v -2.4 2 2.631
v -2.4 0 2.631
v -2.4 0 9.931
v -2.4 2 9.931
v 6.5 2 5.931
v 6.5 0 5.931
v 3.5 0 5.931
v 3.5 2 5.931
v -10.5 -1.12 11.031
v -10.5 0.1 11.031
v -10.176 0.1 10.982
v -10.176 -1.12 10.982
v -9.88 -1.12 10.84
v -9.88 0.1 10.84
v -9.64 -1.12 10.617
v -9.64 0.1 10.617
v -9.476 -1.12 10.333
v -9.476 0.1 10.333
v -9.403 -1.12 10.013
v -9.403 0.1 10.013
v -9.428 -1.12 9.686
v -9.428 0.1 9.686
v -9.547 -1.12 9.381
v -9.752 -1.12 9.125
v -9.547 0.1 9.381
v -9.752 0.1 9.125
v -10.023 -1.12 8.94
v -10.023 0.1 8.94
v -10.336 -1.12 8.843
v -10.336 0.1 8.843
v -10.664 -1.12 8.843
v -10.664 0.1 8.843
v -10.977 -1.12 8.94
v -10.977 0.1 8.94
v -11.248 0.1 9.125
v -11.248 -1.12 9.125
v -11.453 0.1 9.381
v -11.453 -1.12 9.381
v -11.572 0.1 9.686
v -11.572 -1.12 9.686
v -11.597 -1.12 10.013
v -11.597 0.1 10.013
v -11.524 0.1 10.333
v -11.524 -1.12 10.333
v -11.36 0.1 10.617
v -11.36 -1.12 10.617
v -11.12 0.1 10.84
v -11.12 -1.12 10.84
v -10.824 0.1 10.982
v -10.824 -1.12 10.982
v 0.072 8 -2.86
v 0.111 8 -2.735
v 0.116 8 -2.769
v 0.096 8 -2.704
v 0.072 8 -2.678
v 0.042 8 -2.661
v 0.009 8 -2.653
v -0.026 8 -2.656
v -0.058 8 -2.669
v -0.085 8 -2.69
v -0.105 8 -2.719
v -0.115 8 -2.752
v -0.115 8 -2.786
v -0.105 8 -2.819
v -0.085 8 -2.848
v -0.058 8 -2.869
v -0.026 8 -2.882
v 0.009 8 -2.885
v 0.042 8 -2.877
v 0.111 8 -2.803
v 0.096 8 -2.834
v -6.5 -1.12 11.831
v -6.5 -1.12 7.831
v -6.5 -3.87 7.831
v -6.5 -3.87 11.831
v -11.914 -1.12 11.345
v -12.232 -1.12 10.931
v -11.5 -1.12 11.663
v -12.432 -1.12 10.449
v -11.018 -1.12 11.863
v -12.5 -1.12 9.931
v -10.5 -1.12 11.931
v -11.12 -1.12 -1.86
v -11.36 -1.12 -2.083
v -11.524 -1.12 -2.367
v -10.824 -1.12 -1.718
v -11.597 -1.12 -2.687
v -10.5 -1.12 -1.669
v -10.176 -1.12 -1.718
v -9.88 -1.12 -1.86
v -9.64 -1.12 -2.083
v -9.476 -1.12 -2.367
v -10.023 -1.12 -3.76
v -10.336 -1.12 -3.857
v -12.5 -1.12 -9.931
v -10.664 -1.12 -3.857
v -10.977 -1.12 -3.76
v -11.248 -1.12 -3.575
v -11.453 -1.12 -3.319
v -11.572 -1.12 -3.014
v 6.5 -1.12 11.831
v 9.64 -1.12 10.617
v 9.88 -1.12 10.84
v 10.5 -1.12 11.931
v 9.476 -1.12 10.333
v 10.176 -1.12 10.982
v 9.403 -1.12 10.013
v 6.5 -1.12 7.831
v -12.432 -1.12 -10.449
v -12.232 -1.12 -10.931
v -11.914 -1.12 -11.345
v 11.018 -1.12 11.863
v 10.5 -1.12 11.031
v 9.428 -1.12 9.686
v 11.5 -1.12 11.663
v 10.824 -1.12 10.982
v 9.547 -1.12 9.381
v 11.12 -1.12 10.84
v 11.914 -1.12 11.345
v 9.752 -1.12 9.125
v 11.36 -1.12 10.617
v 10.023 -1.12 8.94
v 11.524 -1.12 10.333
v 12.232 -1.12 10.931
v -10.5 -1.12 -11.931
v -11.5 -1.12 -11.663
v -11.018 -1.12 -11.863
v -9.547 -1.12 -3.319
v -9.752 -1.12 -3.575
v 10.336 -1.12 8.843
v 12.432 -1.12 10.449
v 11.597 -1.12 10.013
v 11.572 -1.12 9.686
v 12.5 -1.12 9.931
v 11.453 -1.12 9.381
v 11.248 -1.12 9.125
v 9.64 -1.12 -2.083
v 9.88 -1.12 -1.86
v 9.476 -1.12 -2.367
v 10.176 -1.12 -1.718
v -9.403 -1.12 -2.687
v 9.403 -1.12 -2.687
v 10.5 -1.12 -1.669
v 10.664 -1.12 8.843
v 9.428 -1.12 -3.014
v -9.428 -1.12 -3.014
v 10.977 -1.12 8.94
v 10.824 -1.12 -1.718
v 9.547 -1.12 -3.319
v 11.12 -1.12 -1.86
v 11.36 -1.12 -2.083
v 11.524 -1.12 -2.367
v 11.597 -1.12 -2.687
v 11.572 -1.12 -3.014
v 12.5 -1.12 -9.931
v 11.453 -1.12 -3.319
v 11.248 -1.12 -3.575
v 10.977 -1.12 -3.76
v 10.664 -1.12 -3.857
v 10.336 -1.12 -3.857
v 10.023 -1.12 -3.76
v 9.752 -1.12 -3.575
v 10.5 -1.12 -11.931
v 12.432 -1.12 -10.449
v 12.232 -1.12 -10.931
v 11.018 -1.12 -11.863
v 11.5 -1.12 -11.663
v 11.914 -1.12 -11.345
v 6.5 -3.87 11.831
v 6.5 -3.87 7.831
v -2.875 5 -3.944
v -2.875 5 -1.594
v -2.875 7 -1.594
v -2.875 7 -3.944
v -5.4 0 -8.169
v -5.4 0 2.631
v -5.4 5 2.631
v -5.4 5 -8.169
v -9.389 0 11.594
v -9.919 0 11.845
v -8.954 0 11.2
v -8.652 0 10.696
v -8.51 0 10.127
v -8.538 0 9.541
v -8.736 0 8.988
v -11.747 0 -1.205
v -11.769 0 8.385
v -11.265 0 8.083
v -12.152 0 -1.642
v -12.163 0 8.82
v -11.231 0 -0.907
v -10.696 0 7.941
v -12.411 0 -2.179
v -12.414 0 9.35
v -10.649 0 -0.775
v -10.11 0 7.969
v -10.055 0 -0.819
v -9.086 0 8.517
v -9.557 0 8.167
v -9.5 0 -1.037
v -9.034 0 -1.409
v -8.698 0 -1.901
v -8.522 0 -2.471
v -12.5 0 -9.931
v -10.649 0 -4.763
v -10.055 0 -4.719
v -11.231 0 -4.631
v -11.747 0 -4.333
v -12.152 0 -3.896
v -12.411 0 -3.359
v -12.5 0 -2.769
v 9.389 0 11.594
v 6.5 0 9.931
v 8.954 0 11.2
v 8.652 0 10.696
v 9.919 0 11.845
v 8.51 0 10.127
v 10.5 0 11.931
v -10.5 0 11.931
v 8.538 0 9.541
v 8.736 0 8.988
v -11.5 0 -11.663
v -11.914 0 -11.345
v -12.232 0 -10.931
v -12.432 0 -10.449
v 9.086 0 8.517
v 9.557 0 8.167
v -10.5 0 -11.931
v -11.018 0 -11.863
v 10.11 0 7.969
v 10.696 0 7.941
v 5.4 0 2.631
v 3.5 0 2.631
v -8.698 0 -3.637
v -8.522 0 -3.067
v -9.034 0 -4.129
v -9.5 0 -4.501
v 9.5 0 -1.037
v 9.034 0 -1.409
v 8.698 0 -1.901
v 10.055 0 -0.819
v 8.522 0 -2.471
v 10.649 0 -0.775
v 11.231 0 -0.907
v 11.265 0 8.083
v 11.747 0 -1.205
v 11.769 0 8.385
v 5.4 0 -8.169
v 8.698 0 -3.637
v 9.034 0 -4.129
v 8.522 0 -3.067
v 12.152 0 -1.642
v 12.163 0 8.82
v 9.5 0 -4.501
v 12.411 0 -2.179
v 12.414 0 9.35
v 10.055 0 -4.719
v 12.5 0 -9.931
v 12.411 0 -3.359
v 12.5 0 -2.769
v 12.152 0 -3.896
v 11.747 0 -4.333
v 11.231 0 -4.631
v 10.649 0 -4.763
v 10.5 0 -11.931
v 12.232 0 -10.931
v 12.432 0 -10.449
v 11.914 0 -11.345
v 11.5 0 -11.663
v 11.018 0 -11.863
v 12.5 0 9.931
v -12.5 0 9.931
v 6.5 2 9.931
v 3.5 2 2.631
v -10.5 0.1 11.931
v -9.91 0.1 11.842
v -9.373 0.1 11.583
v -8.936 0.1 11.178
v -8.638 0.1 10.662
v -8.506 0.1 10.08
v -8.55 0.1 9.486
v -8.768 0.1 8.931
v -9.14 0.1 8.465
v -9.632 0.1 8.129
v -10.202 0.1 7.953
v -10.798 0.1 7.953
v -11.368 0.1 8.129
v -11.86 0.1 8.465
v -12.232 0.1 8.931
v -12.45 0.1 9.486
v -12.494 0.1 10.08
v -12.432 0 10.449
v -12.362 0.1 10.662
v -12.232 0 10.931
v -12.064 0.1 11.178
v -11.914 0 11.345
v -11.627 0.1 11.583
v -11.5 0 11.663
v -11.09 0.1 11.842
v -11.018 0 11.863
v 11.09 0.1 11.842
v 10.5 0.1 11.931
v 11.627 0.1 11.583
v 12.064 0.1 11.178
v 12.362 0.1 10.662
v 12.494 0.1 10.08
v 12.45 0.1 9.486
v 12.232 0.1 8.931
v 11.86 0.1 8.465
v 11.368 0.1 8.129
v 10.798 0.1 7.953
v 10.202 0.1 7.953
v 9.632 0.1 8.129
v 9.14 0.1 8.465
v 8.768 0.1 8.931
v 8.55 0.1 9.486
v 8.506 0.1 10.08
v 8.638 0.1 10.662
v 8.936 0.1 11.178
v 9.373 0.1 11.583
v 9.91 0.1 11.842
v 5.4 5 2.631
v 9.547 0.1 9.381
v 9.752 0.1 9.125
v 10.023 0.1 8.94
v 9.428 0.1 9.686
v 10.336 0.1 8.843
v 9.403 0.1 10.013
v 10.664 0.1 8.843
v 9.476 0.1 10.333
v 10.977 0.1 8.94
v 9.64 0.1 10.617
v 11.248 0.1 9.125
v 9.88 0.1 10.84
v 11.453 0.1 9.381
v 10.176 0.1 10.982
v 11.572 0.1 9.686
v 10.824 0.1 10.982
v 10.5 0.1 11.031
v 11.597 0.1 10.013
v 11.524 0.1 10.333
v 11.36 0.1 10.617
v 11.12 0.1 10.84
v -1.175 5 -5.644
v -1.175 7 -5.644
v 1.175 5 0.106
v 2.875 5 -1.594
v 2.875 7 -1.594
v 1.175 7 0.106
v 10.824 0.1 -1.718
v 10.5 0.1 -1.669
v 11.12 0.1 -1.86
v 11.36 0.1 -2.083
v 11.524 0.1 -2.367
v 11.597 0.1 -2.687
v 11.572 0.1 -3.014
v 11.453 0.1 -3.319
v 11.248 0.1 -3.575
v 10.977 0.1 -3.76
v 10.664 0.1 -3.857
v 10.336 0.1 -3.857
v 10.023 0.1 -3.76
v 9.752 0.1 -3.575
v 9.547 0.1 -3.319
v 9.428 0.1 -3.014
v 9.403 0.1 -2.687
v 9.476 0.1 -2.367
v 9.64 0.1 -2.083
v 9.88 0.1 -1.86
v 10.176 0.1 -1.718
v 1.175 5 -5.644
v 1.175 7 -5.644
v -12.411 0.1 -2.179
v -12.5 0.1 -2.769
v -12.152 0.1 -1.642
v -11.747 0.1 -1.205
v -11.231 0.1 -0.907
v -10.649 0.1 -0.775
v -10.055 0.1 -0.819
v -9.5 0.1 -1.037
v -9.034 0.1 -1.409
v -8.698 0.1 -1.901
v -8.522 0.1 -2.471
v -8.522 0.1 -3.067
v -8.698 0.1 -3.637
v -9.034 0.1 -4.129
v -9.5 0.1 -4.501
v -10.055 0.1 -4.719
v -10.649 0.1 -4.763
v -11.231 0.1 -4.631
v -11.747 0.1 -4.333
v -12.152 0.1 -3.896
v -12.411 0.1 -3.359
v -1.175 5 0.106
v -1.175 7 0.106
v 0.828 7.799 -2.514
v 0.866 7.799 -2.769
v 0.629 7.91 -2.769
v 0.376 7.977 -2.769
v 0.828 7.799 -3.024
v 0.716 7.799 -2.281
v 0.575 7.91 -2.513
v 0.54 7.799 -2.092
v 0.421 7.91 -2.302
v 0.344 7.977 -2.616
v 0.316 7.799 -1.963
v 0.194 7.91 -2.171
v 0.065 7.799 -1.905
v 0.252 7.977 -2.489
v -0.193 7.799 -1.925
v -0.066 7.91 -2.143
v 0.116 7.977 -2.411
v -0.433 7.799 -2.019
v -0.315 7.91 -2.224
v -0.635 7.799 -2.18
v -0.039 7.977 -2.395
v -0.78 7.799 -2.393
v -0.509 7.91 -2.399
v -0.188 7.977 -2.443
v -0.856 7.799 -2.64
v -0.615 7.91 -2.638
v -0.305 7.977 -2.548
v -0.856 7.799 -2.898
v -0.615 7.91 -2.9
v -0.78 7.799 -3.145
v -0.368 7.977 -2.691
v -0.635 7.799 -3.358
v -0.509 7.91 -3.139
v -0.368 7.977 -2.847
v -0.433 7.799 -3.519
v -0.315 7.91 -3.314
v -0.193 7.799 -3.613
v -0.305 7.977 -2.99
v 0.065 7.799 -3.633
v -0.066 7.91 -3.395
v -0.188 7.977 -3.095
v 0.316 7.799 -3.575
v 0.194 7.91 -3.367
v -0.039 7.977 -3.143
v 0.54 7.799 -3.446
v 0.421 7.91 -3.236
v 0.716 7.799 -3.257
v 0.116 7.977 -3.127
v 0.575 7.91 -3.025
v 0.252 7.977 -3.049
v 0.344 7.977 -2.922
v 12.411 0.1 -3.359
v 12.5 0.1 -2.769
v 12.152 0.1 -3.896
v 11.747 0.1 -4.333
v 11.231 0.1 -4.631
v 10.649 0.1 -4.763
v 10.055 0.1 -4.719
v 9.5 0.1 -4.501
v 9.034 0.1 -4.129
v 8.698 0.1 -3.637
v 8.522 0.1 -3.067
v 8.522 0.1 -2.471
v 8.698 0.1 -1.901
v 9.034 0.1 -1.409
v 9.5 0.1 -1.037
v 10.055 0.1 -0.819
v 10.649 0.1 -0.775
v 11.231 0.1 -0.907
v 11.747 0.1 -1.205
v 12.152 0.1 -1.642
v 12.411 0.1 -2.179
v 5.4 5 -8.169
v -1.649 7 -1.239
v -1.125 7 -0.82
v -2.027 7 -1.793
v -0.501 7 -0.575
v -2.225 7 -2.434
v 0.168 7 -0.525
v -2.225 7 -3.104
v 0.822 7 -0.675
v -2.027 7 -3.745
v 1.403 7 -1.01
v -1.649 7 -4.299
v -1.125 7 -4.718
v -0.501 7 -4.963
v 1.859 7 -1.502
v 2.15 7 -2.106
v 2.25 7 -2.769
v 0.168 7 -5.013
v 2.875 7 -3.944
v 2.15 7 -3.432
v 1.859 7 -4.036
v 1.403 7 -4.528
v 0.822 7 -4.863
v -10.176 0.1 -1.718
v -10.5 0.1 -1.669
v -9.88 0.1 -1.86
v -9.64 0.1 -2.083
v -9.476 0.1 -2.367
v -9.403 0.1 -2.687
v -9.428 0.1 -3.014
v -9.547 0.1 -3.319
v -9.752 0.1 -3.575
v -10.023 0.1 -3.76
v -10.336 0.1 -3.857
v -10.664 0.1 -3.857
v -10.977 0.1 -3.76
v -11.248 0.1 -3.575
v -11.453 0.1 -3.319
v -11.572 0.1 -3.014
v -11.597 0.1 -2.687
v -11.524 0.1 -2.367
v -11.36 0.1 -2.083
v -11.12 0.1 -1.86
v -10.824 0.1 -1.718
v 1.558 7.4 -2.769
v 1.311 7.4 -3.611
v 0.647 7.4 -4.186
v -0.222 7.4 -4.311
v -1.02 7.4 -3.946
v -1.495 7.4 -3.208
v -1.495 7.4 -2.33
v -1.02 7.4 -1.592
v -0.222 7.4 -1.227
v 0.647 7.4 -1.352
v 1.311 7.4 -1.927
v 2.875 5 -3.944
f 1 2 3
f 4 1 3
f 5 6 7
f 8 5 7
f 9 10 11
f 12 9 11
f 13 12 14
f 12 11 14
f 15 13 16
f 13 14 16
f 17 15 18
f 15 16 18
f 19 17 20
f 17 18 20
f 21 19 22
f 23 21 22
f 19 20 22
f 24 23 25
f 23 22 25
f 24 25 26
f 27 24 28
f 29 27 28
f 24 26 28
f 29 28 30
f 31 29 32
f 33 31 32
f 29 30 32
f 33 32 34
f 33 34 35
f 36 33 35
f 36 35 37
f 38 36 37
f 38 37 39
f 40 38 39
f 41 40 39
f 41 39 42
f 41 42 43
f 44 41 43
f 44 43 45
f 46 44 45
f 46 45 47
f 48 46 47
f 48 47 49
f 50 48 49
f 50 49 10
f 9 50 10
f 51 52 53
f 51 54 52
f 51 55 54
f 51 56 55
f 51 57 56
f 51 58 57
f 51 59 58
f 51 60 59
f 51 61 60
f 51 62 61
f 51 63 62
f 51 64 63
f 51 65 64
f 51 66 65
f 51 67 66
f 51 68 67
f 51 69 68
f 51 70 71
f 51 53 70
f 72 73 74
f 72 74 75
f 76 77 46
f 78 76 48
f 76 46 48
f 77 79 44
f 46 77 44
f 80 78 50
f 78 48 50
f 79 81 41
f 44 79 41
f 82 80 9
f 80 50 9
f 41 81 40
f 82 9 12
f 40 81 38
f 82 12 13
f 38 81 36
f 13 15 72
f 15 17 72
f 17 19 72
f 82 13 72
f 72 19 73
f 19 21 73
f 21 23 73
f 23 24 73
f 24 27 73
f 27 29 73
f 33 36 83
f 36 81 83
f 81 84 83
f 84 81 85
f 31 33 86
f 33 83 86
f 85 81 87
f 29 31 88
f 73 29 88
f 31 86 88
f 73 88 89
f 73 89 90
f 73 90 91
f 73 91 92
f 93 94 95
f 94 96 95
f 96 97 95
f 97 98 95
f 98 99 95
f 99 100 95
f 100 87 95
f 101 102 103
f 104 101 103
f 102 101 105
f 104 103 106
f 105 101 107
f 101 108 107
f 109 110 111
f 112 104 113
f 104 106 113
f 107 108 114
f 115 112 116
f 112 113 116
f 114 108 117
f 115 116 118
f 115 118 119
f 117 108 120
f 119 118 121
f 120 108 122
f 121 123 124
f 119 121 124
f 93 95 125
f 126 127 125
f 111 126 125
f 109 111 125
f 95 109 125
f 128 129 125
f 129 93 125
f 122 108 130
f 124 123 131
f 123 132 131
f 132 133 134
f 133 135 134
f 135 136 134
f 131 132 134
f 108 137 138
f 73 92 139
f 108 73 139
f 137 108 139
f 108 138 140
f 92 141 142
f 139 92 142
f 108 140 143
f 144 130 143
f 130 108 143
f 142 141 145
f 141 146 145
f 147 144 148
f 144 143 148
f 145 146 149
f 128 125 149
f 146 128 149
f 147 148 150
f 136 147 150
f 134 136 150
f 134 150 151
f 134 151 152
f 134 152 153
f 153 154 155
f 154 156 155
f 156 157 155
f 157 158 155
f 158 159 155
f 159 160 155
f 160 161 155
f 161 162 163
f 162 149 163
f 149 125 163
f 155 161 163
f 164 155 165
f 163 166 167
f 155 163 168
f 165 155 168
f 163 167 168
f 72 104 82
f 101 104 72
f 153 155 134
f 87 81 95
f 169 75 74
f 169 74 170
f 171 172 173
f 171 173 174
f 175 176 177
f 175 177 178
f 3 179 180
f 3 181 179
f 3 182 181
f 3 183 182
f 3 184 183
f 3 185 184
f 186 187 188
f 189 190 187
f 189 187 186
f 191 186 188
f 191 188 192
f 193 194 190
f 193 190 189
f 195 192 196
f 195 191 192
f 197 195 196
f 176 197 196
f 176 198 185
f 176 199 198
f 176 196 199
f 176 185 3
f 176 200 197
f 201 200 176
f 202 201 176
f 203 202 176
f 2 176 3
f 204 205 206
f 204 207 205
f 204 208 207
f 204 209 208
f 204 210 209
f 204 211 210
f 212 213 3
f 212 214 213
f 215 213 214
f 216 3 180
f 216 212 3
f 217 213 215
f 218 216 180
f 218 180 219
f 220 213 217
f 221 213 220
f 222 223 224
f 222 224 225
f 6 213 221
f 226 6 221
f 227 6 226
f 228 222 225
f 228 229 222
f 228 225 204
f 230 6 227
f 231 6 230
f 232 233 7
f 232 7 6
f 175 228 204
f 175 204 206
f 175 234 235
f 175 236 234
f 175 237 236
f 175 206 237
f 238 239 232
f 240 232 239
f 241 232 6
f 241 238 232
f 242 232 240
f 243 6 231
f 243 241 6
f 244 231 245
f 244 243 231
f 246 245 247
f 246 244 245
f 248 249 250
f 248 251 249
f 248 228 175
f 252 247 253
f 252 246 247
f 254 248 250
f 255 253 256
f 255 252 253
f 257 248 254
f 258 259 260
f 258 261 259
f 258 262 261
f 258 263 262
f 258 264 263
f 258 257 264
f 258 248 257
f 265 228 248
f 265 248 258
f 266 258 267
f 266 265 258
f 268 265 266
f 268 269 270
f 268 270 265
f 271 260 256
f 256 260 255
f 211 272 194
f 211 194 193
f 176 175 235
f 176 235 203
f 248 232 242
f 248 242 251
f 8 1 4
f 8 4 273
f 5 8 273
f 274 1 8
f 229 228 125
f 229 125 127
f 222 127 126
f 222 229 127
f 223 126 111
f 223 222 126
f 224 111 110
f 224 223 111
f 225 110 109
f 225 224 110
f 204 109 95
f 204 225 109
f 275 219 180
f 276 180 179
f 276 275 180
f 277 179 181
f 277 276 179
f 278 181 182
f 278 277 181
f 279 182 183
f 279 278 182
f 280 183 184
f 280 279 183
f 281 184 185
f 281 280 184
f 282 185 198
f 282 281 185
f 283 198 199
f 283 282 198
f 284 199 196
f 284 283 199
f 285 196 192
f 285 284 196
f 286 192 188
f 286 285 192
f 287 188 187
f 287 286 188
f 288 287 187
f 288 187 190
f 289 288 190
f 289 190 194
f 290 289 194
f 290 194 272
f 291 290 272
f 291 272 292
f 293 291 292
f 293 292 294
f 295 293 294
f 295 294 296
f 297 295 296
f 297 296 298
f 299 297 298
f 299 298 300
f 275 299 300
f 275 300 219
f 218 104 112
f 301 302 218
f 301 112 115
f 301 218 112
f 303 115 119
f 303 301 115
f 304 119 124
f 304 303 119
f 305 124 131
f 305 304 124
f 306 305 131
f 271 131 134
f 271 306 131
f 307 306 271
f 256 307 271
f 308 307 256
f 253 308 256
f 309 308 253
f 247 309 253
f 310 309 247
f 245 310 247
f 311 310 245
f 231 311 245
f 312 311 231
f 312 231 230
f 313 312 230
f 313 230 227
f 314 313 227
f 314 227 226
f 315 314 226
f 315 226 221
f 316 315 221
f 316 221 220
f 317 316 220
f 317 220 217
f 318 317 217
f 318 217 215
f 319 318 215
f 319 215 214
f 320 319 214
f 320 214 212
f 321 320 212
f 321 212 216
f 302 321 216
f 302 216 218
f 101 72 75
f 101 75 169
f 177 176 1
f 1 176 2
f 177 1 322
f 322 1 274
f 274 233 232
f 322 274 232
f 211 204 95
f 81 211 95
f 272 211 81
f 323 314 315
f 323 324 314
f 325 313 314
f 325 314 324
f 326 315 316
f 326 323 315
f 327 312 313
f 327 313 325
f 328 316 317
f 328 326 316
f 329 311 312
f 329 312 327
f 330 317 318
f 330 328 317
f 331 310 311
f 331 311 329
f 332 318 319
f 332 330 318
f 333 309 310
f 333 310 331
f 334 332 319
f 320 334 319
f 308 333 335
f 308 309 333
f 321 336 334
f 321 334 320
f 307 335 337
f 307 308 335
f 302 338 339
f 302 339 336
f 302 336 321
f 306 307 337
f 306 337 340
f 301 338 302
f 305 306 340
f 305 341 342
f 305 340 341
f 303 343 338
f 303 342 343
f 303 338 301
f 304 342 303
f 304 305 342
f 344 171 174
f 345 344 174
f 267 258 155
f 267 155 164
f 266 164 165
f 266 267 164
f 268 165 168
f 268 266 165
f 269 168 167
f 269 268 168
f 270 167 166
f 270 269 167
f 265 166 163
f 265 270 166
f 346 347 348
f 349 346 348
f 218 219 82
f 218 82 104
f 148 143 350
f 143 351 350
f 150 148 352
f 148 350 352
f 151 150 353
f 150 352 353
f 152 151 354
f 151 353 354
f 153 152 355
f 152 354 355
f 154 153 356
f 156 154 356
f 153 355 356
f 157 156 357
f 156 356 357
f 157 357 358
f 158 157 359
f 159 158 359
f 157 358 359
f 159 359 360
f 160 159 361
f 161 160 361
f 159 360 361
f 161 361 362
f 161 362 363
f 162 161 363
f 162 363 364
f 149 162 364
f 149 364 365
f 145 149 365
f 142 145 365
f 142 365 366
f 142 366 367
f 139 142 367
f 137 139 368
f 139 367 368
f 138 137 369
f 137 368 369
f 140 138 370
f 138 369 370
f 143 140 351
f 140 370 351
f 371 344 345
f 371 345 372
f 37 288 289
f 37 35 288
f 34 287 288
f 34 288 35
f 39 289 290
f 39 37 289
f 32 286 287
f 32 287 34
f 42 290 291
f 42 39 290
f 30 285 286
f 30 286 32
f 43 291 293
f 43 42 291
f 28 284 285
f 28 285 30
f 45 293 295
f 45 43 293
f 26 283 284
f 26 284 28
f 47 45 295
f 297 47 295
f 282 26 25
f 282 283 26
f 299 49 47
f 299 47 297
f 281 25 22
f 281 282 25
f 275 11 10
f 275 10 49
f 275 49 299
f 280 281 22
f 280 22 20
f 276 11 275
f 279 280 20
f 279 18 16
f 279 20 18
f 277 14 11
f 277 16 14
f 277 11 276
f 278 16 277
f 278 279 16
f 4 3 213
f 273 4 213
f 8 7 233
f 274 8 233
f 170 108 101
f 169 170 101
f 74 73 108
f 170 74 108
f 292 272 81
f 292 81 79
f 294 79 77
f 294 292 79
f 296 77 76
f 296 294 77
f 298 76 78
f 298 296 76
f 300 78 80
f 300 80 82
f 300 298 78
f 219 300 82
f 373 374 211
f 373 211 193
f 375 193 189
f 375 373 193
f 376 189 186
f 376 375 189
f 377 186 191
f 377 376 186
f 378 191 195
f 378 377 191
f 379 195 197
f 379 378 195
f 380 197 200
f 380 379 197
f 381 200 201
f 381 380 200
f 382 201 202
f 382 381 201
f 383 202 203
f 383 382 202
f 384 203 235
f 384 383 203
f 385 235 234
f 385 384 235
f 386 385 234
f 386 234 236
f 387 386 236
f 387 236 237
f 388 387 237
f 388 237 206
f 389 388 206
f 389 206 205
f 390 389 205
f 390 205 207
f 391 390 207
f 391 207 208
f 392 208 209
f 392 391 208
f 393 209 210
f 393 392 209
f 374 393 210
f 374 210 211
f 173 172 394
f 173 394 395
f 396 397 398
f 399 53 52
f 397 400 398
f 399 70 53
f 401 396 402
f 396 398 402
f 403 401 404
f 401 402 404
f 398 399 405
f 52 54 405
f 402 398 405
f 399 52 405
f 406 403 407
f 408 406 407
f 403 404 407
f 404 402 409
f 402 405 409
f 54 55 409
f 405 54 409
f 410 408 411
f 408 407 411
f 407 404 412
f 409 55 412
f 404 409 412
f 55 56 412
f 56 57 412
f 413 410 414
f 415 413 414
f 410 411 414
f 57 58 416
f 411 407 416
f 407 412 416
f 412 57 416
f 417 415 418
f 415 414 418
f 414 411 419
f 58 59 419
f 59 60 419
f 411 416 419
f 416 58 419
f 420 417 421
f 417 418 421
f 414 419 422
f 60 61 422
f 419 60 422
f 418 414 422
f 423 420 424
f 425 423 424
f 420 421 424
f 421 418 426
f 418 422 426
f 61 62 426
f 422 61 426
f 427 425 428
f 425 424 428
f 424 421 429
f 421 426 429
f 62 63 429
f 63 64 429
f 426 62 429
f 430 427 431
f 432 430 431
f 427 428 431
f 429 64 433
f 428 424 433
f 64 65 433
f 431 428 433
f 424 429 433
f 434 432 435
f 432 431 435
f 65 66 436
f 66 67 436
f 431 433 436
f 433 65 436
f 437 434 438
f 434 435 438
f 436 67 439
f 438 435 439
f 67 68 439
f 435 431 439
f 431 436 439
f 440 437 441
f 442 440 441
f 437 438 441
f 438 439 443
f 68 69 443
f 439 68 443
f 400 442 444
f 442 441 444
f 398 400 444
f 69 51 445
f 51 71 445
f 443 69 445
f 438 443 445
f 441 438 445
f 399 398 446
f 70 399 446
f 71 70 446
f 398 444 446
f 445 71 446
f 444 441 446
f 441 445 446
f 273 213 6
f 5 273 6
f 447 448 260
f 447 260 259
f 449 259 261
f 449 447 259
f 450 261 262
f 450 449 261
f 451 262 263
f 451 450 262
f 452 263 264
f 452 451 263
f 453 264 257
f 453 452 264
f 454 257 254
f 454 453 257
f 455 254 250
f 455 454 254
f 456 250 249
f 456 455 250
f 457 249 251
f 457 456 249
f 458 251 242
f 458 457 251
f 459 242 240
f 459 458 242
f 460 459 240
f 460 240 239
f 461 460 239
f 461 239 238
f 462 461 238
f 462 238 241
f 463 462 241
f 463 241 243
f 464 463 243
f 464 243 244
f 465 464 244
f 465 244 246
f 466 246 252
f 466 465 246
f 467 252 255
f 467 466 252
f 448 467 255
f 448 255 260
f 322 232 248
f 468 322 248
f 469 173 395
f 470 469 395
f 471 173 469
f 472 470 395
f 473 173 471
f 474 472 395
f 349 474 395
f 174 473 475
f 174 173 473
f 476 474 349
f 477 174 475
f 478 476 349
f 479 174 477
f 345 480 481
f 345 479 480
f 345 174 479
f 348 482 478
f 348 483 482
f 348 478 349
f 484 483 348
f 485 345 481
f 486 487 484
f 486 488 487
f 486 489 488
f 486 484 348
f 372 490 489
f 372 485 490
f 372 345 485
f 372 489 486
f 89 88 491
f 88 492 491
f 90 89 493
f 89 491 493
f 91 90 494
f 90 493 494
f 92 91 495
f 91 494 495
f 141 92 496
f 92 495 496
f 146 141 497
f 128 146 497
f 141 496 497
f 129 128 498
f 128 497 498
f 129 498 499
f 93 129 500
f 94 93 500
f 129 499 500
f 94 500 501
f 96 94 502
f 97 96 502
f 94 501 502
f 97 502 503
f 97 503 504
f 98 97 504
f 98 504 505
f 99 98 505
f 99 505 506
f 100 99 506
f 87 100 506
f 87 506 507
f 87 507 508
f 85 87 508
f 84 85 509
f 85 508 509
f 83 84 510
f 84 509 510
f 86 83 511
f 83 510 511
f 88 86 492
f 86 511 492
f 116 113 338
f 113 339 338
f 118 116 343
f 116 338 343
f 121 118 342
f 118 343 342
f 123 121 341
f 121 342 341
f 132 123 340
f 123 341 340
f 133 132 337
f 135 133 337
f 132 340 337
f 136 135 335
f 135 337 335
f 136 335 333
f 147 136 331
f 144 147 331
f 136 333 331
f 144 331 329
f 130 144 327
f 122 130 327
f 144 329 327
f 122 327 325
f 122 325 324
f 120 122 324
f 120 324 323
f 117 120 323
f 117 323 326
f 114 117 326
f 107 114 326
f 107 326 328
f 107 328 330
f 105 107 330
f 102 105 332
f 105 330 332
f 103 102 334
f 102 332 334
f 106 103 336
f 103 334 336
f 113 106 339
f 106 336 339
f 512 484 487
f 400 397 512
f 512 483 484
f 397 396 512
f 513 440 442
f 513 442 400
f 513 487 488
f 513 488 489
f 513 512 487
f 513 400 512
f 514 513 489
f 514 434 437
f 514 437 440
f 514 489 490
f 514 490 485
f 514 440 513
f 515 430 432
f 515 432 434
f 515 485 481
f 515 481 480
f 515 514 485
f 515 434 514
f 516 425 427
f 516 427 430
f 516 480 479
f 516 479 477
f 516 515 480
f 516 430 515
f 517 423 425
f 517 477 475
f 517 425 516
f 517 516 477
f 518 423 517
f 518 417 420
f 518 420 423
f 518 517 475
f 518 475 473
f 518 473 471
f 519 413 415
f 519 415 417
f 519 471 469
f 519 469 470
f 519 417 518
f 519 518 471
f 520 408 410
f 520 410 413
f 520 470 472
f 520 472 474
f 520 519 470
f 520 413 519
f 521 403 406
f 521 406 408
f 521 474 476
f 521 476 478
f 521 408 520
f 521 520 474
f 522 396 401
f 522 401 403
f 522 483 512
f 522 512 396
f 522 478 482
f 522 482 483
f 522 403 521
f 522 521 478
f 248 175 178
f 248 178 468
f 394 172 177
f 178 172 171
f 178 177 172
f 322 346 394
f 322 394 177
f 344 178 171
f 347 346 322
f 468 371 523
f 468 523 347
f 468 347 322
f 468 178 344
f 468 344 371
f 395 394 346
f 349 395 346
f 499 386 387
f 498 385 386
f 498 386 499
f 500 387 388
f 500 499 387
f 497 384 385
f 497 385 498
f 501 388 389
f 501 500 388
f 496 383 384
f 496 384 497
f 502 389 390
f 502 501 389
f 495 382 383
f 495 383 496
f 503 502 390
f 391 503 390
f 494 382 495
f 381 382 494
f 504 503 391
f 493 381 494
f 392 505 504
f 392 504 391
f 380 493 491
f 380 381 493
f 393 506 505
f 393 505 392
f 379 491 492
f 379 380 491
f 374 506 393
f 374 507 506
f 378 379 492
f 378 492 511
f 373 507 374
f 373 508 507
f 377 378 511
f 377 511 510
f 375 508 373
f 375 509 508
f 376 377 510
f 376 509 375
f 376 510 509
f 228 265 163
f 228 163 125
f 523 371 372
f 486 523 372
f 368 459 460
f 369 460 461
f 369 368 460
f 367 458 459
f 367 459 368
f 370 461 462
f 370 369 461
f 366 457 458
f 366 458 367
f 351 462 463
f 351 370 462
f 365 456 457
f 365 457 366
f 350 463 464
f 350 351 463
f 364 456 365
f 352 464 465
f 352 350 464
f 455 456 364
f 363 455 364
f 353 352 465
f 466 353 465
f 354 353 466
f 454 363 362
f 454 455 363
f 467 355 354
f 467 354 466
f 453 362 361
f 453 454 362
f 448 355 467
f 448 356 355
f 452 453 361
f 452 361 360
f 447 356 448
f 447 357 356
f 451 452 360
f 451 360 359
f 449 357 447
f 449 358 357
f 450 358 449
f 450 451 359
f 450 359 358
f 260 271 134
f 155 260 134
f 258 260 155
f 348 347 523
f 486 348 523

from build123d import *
from build123d.topology import SkipClean

# Parameters (mm, degrees)
SKETCH1_R           = 1.1
BOSS_EXTRUDE1_DEPTH = 1.12
SKETCH1_3_W         = 5.75
SKETCH1_3_H         = 5.75
BOSS_EXTRUDE2_DEPTH = 7
SKETCH1_4_W         = 5.75
SKETCH1_4_H         = 5.75
BOSS_EXTRUDE3_DEPTH = 5
BOSS_EXTRUDE4_DEPTH = 2
BOSS_EXTRUDE5_START = 0.1
SKETCH1_7_R         = 2
SKETCH1_7_R_2       = 1.1
BOSS_EXTRUDE5_DEPTH = 0.1
CHAMFER1_SIZE       = 1.7
SKETCH3_R           = 2.25
BOSS_EXTRUDE6_DEPTH = 1
BOSS_EXTRUDE6_TAPER = 60
FILLET1_R           = 1.5
SKETCH4_W           = 13
SKETCH4_H           = 4
BOSS_EXTRUDE7_DEPTH = 2.75


with BuildPart() as part:
    # Sketch1 → Boss-Extrude1 (new body)
    with BuildSketch(Plane(origin=(0, 0, 0), x_dir=(1, 0, 0), z_dir=(0, 1, 0))):
        with BuildLine():
            ThreePointArc((-12.5, -9.931), (-11.914214, -11.345214), (-10.5, -11.931))
            Line((-10.5, -11.931), (10.5, -11.931))
            ThreePointArc((10.5, -11.931), (11.914214, -11.345214), (12.5, -9.931))
            Line((12.5, -9.931), (12.5, 9.931))
            ThreePointArc((12.5, 9.931), (11.914214, 11.345214), (10.5, 11.931))
            Line((10.5, 11.931), (-10.5, 11.931))
            ThreePointArc((-10.5, 11.931), (-11.914214, 11.345214), (-12.5, 9.931))
            Line((-12.5, 9.931), (-12.5, -9.931))
        make_face()
        with Locations((-10.5, -9.931)):
            Circle(SKETCH1_R, mode=Mode.SUBTRACT)
        with Locations((10.5, -9.931)):
            Circle(SKETCH1_R, mode=Mode.SUBTRACT)
        with Locations((-10.5, 2.769)):
            Circle(SKETCH1_R, mode=Mode.SUBTRACT)
        with Locations((10.5, 2.769)):
            Circle(SKETCH1_R, mode=Mode.SUBTRACT)
    extrude(amount=-BOSS_EXTRUDE1_DEPTH)

    # Sketch1<3> → Boss-Extrude2 (add)
    with BuildSketch(Plane(origin=(0, 0, 0), x_dir=(1, 0, 0), z_dir=(0, 1, 0))):
        with Locations((0, 2.769)):
            Rectangle(SKETCH1_3_W, SKETCH1_3_H)
    extrude(amount=BOSS_EXTRUDE2_DEPTH)

    # Sketch1<4> → Boss-Extrude3 (add)
    with BuildSketch(Plane(origin=(0, 0, 0), x_dir=(1, 0, 0), z_dir=(0, 1, 0))):
        Polygon((-5.4, 8.169), (-5.4, -2.631), (-2.4, -2.631), (3.5, -2.631), (5.4, -2.631), (5.4, 8.169), align=None)
        with Locations((0, 2.769)):
            Rectangle(SKETCH1_4_W, SKETCH1_4_H, mode=Mode.SUBTRACT)
    extrude(amount=BOSS_EXTRUDE3_DEPTH)

    # Sketch1<6> → Boss-Extrude4 (add)
    with BuildSketch(Plane(origin=(0, 0, 0), x_dir=(1, 0, 0), z_dir=(0, 1, 0))):
        Polygon((3.5, -2.631), (-2.4, -2.631), (-2.4, -9.931), (6.5, -9.931), (6.5, -5.931), (3.5, -5.931), align=None)
    extrude(amount=BOSS_EXTRUDE4_DEPTH)

    # Sketch1<7> → Boss-Extrude5 (add)
    # profile 1 of 4: a face of its own
    with BuildSketch(Plane(origin=(0, 0, 0), x_dir=(1, 0, 0), z_dir=(0, 1, 0)).offset(BOSS_EXTRUDE5_START)):
        with Locations((10.5, 2.769)):
            Circle(SKETCH1_7_R)
        with Locations((10.5, 2.769)):
            Circle(SKETCH1_7_R_2, mode=Mode.SUBTRACT)
    # profile 2 of 4: a face of its own
    with BuildSketch(Plane(origin=(0, 0, 0), x_dir=(1, 0, 0), z_dir=(0, 1, 0)).offset(BOSS_EXTRUDE5_START)):
        with Locations((-10.5, 2.769)):
            Circle(SKETCH1_7_R)
        with Locations((-10.5, 2.769)):
            Circle(SKETCH1_7_R_2, mode=Mode.SUBTRACT)
    # profile 3 of 4: a face of its own
    with BuildSketch(Plane(origin=(0, 0, 0), x_dir=(1, 0, 0), z_dir=(0, 1, 0)).offset(BOSS_EXTRUDE5_START)):
        with Locations((-10.5, -9.931)):
            Circle(SKETCH1_7_R)
        with Locations((-10.5, -9.931)):
            Circle(SKETCH1_7_R_2, mode=Mode.SUBTRACT)
    # profile 4 of 4: a face of its own
    with BuildSketch(Plane(origin=(0, 0, 0), x_dir=(1, 0, 0), z_dir=(0, 1, 0)).offset(BOSS_EXTRUDE5_START)):
        with Locations((10.5, -9.931)):
            Circle(SKETCH1_7_R)
        with Locations((10.5, -9.931)):
            Circle(SKETCH1_7_R_2, mode=Mode.SUBTRACT)
    extrude(amount=-BOSS_EXTRUDE5_DEPTH)

    # Chamfer1
    chamfer1_edges = [part.edges().sort_by_distance(p)[0] for p in [
        (-2.875, 6, -5.644),
        (2.875, 6, -5.644),
        (2.875, 6, 0.106),
        (-2.875, 6, 0.106),
    ]]
    chamfer(chamfer1_edges, length=CHAMFER1_SIZE)

    # Sketch3 → Boss-Extrude6 (add)
    with SkipClean():  # the faces are left unmerged after this step: merging them gives an invalid solid
        with BuildSketch(Plane(origin=(0, 7, 0), x_dir=(1, 0, 0), z_dir=(0, 1, 0))):
            with Locations((0, 2.769)):
                Circle(SKETCH3_R)
        extrude(amount=BOSS_EXTRUDE6_DEPTH, taper=BOSS_EXTRUDE6_TAPER)

    # Fillet1
    fillet1_edges = [part.edges().sort_by_distance(p)[0] for p in [
        (-0.517949, 8, -2.769),
    ]]
    fillet(fillet1_edges, radius=FILLET1_R)

    # Sketch4 → Boss-Extrude7 (add)
    with SkipClean():  # the faces are left unmerged after this step: merging them gives an invalid solid
        with BuildSketch(Plane.XZ.offset(1.12)):
            with Locations((0, 9.831)):
                Rectangle(SKETCH4_W, SKETCH4_H)
        extrude(amount=BOSS_EXTRUDE7_DEPTH)


solid = part.part
